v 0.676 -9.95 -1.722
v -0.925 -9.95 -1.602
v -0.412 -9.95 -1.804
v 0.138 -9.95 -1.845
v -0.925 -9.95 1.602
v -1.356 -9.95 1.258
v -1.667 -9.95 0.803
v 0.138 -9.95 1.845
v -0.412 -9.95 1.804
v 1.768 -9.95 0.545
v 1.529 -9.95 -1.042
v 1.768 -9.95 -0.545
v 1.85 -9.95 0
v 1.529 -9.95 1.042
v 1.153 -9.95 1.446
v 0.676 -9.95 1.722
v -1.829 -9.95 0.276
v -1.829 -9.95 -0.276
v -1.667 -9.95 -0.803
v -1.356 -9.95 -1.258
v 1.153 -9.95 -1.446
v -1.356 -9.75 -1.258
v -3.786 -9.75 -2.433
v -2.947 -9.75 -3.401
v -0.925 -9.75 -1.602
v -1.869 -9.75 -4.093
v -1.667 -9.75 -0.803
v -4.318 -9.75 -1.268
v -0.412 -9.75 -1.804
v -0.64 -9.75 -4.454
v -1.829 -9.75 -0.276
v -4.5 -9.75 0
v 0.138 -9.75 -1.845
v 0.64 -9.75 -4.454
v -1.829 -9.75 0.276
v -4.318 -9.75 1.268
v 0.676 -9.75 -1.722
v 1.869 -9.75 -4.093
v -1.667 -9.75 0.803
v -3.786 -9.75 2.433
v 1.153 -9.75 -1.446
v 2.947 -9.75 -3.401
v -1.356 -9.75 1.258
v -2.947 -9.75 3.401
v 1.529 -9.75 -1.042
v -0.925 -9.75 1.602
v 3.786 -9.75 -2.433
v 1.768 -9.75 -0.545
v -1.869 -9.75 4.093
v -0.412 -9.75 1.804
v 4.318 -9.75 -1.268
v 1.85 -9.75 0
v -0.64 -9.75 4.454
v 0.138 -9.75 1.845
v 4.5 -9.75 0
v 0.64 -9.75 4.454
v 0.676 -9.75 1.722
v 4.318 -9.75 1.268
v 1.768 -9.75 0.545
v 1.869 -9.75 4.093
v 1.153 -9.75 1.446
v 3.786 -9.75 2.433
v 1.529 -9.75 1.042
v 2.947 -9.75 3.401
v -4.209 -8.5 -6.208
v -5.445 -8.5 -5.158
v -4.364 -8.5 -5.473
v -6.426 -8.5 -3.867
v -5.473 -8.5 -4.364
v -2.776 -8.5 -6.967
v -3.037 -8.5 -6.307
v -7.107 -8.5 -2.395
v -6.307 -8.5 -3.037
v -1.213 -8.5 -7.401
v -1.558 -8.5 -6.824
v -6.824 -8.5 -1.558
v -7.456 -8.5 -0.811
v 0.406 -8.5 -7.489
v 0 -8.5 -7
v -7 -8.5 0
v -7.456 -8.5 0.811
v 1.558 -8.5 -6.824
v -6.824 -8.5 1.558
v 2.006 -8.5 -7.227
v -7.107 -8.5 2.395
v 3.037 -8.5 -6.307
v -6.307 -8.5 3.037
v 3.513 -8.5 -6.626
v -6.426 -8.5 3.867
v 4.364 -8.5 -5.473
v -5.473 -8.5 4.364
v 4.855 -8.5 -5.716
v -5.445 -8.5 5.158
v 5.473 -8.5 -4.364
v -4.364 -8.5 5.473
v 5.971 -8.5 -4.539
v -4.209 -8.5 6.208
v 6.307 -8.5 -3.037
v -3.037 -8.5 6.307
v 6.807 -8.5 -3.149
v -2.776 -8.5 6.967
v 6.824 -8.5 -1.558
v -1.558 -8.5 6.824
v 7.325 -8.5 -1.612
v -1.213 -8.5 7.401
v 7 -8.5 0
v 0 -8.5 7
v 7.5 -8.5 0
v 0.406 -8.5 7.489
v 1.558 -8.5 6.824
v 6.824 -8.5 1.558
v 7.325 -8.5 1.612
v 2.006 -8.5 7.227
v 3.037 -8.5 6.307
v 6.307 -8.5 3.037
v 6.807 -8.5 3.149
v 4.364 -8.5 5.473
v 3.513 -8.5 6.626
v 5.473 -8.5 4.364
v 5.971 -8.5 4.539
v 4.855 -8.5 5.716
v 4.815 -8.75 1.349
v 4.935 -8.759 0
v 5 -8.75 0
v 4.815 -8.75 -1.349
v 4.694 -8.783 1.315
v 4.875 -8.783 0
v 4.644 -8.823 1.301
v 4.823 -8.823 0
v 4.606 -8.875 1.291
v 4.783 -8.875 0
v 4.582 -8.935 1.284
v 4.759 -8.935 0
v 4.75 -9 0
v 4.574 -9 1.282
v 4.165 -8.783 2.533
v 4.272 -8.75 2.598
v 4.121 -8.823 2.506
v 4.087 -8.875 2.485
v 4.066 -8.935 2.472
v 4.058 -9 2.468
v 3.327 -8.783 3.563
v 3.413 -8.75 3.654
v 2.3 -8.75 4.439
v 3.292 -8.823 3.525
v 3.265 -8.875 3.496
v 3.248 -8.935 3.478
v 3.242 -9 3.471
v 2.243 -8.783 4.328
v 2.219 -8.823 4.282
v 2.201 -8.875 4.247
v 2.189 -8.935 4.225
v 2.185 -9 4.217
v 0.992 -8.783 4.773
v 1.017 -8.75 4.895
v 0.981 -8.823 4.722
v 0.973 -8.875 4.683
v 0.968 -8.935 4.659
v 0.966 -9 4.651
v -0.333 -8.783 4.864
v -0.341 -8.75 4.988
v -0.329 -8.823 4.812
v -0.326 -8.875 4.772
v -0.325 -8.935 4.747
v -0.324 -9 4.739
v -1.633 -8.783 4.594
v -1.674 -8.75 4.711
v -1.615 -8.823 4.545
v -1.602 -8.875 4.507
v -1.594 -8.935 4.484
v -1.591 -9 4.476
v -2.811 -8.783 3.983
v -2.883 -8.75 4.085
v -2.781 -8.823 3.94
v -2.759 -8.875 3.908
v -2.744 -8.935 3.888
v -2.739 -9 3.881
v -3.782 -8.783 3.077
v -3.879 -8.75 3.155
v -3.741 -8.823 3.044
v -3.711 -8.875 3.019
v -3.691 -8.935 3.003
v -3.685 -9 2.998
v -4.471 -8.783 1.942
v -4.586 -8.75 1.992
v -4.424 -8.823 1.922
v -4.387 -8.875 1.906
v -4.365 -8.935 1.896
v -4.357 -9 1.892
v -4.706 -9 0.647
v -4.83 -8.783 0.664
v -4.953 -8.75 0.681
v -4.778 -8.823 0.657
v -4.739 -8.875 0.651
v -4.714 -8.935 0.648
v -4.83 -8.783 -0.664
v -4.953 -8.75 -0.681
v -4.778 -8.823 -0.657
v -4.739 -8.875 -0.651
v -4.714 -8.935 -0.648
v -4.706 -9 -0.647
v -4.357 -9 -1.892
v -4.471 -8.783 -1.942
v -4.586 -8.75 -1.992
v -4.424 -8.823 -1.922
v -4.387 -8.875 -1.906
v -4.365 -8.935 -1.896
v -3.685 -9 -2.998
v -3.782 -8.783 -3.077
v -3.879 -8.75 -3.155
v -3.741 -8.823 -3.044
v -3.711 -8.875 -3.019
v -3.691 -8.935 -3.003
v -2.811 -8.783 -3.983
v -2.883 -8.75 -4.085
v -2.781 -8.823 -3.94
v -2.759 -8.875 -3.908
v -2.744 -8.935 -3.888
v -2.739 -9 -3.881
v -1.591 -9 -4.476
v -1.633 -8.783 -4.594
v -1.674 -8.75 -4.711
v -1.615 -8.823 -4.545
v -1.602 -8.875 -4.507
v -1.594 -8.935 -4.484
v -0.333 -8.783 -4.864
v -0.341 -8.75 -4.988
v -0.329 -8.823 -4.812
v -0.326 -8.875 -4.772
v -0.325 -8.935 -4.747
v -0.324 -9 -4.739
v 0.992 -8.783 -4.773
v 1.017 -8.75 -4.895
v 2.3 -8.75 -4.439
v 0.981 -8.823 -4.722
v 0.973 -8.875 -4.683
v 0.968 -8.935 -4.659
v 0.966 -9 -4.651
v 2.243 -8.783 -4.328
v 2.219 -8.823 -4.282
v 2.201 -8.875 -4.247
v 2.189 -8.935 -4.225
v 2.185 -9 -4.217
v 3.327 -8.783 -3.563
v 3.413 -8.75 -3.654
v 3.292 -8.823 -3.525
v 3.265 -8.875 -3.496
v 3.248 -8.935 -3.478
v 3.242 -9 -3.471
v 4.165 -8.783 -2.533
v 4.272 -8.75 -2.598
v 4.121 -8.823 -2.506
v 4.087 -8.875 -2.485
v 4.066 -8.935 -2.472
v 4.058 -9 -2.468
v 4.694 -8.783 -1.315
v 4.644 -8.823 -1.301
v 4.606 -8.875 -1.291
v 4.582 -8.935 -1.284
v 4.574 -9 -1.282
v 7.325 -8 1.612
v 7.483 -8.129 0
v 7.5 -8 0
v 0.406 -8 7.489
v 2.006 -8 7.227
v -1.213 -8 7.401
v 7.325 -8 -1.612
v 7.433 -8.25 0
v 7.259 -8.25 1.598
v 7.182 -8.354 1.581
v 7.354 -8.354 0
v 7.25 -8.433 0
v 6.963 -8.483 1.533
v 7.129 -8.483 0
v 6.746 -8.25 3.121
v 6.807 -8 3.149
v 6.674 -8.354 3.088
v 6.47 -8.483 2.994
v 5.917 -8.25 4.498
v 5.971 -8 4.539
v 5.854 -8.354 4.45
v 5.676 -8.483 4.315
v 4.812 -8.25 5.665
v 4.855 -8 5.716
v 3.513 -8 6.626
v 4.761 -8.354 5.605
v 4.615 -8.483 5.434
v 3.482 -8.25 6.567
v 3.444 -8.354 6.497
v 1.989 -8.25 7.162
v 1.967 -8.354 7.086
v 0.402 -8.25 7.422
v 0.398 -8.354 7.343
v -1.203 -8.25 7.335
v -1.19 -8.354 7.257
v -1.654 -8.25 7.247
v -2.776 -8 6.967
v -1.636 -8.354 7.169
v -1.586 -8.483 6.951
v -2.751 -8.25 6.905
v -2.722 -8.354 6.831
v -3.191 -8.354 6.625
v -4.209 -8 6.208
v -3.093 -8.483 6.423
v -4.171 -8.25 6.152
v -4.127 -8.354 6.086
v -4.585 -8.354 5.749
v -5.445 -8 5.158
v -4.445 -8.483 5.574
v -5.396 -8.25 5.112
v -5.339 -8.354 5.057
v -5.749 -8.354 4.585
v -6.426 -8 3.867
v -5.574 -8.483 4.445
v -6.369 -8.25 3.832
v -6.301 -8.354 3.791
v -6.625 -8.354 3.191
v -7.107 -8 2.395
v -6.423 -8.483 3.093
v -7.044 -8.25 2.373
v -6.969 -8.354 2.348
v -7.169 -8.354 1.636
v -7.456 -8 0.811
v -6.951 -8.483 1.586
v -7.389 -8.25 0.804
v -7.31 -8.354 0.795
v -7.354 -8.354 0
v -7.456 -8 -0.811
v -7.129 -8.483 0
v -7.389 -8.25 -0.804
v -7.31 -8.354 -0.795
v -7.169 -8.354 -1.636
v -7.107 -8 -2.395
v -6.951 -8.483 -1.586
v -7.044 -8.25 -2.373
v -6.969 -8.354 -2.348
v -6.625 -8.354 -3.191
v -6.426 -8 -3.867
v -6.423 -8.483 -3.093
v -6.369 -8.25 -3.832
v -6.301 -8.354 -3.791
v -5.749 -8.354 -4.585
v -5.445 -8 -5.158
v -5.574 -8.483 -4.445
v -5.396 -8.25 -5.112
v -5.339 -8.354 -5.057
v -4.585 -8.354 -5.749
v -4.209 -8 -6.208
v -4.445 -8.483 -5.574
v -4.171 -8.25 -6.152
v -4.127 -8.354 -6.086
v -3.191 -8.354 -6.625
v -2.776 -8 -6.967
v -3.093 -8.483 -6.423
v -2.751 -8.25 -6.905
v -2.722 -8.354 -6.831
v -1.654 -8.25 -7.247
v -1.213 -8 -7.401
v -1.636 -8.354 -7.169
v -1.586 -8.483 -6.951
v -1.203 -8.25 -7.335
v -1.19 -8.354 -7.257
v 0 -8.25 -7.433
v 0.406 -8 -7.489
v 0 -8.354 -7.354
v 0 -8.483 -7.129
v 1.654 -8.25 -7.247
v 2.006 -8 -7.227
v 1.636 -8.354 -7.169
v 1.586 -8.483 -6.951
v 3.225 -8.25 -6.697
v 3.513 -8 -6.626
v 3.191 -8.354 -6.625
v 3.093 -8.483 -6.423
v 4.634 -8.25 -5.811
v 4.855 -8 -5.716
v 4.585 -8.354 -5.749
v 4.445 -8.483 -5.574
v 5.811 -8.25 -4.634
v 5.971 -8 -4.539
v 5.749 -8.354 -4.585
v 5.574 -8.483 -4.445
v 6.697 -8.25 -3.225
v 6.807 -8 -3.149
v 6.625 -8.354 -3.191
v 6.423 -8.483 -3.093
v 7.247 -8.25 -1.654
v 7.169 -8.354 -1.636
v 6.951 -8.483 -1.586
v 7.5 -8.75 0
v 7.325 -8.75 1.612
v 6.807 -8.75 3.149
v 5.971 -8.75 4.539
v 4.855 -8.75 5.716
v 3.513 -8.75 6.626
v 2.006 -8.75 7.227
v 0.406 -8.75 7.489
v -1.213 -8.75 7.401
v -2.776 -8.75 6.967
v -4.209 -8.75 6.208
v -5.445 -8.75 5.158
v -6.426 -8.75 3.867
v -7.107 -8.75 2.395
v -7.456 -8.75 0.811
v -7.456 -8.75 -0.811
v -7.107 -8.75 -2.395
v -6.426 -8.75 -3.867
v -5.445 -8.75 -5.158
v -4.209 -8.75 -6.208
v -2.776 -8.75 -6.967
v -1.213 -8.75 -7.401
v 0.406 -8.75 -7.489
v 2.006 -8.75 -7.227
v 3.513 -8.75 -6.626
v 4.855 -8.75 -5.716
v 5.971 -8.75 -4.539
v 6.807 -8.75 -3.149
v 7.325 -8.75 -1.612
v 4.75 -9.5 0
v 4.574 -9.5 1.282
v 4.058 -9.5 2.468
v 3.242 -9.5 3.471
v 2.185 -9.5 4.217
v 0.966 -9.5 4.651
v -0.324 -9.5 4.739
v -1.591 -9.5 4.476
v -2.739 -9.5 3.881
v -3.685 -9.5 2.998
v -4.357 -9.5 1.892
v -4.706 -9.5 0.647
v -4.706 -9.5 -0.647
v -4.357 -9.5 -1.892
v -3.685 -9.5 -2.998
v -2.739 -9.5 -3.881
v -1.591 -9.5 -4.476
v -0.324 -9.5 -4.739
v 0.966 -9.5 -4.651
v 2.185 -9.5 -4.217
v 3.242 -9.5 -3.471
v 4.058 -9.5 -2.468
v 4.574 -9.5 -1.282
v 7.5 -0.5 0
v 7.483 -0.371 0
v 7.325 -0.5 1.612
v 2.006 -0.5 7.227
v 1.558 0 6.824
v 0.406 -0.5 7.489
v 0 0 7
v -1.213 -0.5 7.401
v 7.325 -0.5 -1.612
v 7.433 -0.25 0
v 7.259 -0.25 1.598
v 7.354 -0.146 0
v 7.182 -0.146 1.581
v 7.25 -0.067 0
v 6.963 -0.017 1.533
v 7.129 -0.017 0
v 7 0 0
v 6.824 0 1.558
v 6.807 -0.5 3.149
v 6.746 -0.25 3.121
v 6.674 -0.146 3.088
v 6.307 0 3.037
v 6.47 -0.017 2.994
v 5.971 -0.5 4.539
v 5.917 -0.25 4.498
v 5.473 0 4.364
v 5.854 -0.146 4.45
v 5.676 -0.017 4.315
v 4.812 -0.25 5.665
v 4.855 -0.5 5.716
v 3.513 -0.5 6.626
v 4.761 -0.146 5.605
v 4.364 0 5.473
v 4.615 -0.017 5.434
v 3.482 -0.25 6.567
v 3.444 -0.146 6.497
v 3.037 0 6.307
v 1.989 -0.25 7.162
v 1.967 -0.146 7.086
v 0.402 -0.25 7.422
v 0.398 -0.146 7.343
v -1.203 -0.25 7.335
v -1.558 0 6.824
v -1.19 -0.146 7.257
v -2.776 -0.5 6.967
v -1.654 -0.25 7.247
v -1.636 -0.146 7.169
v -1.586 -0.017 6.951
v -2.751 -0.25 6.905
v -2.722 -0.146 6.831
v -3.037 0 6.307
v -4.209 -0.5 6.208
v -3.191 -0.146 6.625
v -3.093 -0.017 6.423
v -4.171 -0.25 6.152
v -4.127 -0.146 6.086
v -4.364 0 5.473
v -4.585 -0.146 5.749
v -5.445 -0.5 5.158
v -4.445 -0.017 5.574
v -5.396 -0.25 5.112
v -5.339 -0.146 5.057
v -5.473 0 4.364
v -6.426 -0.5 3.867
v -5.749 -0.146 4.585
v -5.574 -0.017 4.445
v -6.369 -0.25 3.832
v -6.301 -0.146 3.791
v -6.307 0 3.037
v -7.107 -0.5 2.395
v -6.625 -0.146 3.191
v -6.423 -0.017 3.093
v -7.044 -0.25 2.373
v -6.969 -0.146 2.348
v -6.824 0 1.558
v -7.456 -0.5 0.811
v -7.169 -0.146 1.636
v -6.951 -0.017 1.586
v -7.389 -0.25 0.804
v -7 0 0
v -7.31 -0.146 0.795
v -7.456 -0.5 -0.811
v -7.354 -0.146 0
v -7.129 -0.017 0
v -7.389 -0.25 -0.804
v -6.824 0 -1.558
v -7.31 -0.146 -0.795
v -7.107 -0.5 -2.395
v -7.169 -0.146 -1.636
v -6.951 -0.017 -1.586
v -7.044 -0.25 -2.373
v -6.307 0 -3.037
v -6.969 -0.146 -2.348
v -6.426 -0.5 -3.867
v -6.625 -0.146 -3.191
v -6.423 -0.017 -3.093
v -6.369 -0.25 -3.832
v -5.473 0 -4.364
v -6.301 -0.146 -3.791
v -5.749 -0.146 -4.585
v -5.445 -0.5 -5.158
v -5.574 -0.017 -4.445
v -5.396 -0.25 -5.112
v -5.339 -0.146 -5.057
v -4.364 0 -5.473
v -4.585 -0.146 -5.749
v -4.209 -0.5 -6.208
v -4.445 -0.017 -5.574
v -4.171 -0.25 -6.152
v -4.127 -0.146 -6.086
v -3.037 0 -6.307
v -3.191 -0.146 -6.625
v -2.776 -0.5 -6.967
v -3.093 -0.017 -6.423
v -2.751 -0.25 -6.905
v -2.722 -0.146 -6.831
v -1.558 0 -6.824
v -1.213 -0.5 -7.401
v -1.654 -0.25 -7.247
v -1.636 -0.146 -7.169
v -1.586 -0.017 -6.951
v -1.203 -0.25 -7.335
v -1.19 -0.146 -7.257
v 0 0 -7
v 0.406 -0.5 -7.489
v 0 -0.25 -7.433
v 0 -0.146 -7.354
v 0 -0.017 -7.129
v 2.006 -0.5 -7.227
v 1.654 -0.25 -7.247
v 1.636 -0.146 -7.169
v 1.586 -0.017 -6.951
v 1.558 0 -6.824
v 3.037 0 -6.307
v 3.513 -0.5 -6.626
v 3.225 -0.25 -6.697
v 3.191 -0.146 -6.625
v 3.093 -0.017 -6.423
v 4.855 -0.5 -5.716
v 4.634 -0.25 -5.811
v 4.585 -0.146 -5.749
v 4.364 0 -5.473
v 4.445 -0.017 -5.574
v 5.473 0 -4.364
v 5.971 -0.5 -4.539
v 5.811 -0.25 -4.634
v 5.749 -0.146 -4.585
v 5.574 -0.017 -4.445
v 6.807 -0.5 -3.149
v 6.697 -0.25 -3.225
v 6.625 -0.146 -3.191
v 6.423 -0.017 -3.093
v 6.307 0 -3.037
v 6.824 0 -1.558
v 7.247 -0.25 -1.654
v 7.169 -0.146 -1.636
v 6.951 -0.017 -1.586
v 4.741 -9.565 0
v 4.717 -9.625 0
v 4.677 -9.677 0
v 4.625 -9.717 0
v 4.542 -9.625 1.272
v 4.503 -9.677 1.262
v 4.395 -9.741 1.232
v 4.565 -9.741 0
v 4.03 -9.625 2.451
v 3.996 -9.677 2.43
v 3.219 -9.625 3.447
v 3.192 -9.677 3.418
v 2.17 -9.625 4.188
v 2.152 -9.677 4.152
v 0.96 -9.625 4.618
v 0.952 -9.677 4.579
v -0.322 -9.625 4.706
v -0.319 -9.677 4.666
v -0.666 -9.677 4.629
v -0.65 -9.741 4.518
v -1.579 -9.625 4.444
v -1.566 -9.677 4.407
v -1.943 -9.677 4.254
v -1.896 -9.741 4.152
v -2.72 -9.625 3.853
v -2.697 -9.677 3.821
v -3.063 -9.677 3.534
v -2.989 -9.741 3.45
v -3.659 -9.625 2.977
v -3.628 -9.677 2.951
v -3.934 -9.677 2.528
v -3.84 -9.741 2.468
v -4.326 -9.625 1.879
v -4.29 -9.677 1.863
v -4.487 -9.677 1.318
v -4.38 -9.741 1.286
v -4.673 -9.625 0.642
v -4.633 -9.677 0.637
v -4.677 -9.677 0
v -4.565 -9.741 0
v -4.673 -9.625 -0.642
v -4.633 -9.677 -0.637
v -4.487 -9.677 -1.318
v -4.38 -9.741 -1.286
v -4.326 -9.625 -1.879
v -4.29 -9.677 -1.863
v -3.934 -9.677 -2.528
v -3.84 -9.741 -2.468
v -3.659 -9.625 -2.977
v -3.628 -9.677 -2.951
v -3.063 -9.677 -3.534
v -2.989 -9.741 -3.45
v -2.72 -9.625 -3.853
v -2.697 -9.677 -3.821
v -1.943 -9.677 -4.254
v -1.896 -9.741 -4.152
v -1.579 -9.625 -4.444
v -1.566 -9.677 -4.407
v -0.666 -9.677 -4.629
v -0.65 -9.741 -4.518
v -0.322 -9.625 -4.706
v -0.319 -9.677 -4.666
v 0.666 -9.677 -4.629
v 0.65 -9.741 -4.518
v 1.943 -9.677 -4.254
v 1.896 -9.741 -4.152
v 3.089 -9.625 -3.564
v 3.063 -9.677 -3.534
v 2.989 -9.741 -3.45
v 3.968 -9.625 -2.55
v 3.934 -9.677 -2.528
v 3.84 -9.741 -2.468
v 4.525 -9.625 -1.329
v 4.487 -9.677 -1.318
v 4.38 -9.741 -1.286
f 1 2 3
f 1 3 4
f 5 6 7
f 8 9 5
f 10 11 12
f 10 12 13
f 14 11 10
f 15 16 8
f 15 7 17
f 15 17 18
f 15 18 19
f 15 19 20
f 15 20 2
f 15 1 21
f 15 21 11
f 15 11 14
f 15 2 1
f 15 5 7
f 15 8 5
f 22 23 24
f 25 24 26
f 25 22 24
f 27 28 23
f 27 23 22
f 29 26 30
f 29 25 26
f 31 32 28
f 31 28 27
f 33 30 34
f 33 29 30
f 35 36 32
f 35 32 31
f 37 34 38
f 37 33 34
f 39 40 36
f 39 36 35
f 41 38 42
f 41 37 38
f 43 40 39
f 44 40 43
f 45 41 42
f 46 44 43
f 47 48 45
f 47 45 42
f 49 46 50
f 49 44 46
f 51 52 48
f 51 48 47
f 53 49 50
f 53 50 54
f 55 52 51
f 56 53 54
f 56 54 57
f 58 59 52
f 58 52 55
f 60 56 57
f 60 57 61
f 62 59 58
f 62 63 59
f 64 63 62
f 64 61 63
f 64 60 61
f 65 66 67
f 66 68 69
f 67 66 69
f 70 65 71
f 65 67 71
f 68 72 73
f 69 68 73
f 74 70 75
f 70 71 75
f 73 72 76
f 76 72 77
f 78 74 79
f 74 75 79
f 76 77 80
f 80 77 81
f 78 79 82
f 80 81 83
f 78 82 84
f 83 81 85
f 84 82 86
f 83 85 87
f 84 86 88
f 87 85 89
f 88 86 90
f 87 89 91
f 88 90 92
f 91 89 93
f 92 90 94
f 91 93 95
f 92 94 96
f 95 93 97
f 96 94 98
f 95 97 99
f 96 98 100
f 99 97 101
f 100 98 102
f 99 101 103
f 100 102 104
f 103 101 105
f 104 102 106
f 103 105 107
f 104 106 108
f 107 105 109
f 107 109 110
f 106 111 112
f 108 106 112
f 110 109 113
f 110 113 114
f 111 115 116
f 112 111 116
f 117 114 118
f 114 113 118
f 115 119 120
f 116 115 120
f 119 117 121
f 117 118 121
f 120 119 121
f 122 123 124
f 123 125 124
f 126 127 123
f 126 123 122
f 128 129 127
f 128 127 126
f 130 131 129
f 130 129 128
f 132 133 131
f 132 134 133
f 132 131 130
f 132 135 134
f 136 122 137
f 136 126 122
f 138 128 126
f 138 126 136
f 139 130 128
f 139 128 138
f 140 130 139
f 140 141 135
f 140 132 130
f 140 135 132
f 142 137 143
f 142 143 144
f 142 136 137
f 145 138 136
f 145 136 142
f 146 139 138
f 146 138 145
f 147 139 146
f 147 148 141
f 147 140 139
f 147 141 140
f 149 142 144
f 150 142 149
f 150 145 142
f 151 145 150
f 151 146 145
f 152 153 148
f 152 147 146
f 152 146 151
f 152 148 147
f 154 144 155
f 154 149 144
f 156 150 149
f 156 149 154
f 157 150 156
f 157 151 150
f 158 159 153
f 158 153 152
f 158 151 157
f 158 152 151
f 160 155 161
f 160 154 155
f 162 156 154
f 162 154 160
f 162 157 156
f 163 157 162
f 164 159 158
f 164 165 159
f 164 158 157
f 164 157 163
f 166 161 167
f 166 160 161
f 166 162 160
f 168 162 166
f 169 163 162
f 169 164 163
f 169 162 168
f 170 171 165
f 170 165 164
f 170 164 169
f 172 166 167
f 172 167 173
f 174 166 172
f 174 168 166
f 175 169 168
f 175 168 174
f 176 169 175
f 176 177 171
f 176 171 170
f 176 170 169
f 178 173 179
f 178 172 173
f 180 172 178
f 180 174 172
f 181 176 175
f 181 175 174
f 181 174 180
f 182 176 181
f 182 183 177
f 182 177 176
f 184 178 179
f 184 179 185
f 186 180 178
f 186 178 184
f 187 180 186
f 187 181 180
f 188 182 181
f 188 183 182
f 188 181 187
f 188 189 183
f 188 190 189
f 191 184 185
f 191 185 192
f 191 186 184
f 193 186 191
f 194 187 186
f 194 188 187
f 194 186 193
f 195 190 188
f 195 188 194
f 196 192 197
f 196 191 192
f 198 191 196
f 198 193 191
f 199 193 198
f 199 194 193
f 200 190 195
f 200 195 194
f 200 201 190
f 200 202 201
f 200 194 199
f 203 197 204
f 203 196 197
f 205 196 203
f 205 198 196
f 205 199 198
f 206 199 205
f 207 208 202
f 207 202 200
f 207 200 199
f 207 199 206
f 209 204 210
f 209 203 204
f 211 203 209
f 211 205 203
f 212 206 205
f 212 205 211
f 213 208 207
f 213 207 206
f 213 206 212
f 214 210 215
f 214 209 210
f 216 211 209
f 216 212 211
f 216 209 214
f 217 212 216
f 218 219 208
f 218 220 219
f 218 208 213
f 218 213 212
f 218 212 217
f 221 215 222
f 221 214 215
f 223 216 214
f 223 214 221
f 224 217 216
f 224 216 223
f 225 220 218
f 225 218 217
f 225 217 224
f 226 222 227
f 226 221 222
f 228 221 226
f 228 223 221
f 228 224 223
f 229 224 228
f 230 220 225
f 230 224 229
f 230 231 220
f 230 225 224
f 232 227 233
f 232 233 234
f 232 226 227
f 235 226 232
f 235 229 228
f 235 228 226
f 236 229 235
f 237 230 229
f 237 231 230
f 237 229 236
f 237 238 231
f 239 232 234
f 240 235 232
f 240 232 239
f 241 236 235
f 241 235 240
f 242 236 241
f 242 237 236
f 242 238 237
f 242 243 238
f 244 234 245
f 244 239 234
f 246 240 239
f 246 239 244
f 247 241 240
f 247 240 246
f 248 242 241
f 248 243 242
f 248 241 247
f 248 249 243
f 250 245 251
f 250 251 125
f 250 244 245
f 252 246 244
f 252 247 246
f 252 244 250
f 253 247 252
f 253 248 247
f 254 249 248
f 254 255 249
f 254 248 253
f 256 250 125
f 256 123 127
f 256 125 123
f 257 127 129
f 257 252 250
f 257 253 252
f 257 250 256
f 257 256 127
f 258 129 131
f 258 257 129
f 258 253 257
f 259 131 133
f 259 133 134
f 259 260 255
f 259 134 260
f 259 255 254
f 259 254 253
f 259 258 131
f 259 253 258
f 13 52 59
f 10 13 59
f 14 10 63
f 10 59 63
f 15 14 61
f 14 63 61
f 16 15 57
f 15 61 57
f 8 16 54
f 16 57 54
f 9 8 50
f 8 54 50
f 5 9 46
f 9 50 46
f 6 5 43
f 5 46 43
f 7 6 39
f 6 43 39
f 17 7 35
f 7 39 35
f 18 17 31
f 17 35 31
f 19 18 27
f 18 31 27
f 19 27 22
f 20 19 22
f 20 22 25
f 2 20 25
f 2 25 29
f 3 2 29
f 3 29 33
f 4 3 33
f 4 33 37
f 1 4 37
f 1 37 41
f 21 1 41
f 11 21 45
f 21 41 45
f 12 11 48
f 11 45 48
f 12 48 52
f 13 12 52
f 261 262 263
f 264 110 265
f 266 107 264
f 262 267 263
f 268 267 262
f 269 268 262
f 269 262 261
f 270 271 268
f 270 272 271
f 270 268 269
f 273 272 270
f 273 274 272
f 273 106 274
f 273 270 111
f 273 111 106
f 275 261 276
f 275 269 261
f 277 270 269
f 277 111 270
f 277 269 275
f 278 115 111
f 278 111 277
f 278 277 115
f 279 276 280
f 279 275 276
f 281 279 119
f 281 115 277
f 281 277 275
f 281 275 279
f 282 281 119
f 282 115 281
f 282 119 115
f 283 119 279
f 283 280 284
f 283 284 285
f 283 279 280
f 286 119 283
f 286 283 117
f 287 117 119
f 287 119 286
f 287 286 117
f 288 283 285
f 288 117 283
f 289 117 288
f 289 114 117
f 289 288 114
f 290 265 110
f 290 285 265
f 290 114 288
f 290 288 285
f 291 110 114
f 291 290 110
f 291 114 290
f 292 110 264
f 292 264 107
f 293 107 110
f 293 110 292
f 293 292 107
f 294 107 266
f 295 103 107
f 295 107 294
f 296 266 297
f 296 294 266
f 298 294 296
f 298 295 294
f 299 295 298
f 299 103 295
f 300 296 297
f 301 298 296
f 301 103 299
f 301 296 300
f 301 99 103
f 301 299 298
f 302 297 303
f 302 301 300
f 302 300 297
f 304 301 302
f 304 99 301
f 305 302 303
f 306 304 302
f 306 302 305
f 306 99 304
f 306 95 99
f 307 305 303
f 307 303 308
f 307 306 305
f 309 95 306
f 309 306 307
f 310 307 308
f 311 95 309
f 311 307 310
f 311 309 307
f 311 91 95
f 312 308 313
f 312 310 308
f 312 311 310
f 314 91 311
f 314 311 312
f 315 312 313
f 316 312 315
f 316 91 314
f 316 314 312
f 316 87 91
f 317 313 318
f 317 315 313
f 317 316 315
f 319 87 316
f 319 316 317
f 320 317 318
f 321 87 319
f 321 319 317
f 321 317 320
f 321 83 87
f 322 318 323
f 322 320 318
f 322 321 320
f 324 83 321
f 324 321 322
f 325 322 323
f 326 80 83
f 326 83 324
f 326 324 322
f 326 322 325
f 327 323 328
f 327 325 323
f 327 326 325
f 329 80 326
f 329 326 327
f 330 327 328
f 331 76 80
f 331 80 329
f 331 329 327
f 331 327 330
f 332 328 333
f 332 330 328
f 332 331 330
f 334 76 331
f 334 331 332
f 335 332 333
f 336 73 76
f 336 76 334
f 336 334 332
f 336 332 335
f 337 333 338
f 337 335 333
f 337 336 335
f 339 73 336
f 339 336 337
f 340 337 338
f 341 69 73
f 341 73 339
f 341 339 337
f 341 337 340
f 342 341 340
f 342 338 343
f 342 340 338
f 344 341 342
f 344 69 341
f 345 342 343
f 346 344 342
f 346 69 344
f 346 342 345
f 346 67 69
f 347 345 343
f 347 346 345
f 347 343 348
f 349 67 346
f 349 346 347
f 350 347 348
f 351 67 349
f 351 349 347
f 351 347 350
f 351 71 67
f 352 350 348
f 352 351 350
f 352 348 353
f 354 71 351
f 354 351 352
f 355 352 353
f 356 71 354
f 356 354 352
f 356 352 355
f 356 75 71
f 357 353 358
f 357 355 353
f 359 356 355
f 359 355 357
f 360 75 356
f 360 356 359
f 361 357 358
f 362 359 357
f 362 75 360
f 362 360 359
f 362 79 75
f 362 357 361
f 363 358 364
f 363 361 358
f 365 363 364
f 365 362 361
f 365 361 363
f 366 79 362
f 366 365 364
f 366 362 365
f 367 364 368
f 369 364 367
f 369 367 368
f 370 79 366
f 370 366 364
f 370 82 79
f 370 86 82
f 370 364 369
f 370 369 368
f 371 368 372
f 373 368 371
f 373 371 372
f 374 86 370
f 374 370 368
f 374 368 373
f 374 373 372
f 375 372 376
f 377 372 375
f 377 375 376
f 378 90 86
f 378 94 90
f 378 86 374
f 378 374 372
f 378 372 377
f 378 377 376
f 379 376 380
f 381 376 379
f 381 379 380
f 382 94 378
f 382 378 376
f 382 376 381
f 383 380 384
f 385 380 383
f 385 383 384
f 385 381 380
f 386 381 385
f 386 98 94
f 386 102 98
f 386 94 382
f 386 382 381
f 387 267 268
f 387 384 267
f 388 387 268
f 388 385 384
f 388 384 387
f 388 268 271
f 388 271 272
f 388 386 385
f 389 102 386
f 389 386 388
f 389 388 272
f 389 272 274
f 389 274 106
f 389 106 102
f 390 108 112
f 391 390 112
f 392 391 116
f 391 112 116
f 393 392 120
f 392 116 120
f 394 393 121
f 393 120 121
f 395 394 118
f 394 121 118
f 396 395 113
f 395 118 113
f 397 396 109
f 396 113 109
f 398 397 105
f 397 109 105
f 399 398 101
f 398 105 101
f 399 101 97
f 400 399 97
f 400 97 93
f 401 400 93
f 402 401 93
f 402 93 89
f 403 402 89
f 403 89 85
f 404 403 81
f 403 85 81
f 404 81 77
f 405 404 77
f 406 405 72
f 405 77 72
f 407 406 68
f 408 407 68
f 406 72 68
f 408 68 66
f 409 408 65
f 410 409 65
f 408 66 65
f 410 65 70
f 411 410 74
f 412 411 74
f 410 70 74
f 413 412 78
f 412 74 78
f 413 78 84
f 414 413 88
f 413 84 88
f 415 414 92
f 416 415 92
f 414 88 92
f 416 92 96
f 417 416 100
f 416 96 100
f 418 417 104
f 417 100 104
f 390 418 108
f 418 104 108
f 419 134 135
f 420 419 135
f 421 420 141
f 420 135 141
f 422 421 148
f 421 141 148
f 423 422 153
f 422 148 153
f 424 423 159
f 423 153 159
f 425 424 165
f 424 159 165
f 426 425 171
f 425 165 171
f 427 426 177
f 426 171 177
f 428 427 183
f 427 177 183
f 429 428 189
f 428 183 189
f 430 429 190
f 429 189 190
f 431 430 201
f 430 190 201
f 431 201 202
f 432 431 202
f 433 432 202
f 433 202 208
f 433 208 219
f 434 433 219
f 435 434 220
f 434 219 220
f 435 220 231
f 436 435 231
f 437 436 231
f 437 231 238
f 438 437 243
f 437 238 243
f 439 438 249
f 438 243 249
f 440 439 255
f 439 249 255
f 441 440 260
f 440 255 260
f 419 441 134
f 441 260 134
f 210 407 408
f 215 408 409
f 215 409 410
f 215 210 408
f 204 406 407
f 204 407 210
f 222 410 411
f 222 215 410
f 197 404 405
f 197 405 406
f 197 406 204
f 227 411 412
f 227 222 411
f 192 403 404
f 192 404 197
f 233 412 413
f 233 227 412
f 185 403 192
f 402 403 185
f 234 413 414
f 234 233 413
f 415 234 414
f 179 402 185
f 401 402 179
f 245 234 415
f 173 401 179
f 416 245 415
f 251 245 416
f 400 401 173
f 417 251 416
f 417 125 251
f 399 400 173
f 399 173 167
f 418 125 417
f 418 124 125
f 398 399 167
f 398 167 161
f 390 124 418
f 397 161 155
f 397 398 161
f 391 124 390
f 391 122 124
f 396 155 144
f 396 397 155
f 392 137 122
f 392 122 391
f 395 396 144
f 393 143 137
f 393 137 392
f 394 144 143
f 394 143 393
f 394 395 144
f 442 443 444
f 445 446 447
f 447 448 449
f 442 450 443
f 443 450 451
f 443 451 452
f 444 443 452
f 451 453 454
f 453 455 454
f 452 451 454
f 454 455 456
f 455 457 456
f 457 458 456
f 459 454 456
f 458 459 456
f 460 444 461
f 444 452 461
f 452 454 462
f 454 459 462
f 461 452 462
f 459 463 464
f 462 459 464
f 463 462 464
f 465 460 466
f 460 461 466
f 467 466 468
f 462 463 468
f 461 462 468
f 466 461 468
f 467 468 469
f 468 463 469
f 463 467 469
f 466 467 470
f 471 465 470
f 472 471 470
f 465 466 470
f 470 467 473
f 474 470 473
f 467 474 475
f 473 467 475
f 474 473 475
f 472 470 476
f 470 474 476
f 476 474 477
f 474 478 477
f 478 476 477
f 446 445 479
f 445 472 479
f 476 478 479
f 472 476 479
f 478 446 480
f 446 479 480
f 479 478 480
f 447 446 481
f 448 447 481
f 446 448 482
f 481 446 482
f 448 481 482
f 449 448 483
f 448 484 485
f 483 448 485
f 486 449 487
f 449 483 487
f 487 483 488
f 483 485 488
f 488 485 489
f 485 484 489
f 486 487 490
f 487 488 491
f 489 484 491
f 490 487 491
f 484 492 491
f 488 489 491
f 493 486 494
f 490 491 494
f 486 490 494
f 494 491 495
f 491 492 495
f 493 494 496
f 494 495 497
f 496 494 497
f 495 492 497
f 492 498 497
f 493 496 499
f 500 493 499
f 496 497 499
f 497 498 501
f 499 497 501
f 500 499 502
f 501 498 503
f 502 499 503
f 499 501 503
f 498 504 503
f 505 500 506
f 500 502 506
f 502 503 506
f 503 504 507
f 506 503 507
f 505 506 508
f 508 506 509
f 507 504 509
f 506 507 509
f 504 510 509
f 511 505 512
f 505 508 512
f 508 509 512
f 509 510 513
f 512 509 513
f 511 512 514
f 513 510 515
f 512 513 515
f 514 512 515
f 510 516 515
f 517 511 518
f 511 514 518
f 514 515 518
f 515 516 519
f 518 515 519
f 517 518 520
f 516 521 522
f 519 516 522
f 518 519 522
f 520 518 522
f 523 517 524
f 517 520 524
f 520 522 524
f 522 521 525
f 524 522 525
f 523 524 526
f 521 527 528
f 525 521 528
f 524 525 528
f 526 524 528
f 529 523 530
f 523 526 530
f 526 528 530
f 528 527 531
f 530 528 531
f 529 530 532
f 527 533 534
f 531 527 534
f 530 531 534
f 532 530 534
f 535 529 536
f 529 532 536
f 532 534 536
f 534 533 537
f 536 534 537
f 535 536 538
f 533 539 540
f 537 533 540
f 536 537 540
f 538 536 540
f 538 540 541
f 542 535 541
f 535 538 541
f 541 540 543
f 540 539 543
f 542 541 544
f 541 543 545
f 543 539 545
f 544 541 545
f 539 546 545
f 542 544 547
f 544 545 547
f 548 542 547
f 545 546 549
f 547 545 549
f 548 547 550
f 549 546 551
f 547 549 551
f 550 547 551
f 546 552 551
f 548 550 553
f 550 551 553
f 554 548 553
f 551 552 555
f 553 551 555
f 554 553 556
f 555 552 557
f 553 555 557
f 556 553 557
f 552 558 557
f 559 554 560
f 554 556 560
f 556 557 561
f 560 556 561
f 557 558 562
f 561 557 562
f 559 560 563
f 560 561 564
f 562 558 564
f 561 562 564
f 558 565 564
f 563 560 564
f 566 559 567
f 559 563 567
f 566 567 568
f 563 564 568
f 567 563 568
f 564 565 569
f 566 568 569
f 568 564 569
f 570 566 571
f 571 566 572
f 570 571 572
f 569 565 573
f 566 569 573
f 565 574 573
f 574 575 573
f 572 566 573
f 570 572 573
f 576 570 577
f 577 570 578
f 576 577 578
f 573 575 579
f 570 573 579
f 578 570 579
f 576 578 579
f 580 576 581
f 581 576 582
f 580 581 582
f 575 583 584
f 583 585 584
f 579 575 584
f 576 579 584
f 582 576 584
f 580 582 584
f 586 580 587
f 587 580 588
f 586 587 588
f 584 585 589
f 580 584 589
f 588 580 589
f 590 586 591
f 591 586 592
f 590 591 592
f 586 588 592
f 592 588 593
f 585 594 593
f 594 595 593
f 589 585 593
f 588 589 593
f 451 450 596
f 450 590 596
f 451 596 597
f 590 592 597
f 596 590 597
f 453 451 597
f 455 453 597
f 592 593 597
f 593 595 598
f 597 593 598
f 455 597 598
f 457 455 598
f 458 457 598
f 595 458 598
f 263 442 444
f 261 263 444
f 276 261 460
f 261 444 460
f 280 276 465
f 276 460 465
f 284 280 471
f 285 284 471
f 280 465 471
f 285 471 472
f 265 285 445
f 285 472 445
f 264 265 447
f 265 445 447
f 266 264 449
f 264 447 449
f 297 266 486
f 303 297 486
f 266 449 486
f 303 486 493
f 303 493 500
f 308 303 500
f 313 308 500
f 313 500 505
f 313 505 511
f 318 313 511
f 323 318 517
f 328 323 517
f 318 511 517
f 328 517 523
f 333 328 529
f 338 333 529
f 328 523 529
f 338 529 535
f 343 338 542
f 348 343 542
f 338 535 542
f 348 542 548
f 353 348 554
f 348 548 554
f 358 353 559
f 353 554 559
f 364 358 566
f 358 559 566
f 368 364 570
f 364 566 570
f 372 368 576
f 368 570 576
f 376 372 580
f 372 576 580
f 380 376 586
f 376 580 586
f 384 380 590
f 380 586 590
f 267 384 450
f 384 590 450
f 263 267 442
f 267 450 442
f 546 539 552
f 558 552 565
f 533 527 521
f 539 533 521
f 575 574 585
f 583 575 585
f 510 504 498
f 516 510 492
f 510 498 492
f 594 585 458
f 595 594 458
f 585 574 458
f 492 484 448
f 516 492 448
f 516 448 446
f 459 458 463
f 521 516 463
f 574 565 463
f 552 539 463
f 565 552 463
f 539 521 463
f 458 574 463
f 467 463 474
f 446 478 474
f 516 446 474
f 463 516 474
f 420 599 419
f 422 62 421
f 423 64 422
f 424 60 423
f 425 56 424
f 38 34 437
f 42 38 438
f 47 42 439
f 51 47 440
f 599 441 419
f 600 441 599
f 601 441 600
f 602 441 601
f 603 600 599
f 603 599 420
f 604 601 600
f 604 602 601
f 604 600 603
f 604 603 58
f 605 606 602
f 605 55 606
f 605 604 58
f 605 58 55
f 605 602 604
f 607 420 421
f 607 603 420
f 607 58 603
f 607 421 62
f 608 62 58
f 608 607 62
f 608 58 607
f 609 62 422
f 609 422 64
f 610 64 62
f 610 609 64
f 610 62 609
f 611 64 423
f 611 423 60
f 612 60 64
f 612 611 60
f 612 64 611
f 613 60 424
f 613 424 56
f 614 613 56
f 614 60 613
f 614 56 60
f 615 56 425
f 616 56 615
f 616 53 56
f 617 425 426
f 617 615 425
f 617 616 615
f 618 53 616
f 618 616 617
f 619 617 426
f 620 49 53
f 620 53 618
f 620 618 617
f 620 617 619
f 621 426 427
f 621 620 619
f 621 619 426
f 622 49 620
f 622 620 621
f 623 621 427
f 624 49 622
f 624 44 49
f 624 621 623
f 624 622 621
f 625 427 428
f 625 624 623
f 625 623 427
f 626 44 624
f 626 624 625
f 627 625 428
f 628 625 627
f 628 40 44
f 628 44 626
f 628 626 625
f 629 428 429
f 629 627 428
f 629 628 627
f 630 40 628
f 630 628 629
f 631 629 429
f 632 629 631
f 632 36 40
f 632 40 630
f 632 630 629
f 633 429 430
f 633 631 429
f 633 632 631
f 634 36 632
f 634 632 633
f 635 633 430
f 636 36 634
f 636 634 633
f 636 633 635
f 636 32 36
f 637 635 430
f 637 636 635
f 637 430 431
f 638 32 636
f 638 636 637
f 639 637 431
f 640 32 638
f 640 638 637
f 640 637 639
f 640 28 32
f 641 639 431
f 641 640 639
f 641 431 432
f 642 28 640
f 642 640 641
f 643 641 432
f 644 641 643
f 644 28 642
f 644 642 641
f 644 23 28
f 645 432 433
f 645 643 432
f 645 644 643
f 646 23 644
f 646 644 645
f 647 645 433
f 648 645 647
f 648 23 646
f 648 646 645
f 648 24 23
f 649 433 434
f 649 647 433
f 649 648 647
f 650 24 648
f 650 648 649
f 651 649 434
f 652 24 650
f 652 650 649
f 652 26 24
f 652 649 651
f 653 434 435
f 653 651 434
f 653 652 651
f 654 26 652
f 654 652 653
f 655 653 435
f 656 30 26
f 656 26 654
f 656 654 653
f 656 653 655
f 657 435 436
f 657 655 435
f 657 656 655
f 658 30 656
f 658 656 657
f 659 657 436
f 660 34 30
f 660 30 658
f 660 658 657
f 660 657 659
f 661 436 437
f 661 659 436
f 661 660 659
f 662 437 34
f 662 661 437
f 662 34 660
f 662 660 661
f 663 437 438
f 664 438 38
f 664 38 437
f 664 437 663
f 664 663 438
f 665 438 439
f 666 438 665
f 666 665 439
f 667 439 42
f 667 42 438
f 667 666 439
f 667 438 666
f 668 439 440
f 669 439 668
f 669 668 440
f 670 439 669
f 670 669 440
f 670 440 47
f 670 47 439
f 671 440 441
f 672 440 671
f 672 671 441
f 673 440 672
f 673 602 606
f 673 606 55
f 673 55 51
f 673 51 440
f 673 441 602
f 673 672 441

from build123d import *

# Parameters (mm, degrees)
F0_R     = 7.5
F1_DEPTH = 8.5
F2_R     = 0.5
F3_R     = 7.5
F4_DEPTH = 0.25
F5_R     = 4.75
F6_DEPTH = 1
F7_R     = 1.85
F8_DEPTH = 0.2
F9_R     = 0.25


with BuildPart() as f1:
    # F0 (on Front) → F1 (new body)
    with BuildSketch(Plane.XZ):
        Circle(F0_R)
    extrude(amount=F1_DEPTH)

    # F2
    f2_edges = [f1.edges().sort_by_distance(p)[0] for p in [
        (-7.5, -8.5, 0),
        (-7.5, 0, 0),
    ]]
    fillet(f2_edges, radius=F2_R)

    # F3 (on face) → F4 (join)
    with BuildSketch(Plane.XZ.offset(8.5)):
        Circle(F3_R)
    extrude(amount=F4_DEPTH)

    # F5 (on face) → F6 (join)
    with BuildSketch(Plane.XZ.offset(8.75)):
        Circle(F5_R)
    extrude(amount=F6_DEPTH)

    # F7 (on face) → F8 (join)
    with BuildSketch(Plane.XZ.offset(9.75)):
        Circle(F7_R)
    extrude(amount=F8_DEPTH)

    # F9
    f9_edges = [f1.edges().sort_by_distance(p)[0] for p in [
        (-4.75, -8.75, 0),
        (-4.75, -9.75, 0),
    ]]
    fillet(f9_edges, radius=F9_R)


solid = f1.part
